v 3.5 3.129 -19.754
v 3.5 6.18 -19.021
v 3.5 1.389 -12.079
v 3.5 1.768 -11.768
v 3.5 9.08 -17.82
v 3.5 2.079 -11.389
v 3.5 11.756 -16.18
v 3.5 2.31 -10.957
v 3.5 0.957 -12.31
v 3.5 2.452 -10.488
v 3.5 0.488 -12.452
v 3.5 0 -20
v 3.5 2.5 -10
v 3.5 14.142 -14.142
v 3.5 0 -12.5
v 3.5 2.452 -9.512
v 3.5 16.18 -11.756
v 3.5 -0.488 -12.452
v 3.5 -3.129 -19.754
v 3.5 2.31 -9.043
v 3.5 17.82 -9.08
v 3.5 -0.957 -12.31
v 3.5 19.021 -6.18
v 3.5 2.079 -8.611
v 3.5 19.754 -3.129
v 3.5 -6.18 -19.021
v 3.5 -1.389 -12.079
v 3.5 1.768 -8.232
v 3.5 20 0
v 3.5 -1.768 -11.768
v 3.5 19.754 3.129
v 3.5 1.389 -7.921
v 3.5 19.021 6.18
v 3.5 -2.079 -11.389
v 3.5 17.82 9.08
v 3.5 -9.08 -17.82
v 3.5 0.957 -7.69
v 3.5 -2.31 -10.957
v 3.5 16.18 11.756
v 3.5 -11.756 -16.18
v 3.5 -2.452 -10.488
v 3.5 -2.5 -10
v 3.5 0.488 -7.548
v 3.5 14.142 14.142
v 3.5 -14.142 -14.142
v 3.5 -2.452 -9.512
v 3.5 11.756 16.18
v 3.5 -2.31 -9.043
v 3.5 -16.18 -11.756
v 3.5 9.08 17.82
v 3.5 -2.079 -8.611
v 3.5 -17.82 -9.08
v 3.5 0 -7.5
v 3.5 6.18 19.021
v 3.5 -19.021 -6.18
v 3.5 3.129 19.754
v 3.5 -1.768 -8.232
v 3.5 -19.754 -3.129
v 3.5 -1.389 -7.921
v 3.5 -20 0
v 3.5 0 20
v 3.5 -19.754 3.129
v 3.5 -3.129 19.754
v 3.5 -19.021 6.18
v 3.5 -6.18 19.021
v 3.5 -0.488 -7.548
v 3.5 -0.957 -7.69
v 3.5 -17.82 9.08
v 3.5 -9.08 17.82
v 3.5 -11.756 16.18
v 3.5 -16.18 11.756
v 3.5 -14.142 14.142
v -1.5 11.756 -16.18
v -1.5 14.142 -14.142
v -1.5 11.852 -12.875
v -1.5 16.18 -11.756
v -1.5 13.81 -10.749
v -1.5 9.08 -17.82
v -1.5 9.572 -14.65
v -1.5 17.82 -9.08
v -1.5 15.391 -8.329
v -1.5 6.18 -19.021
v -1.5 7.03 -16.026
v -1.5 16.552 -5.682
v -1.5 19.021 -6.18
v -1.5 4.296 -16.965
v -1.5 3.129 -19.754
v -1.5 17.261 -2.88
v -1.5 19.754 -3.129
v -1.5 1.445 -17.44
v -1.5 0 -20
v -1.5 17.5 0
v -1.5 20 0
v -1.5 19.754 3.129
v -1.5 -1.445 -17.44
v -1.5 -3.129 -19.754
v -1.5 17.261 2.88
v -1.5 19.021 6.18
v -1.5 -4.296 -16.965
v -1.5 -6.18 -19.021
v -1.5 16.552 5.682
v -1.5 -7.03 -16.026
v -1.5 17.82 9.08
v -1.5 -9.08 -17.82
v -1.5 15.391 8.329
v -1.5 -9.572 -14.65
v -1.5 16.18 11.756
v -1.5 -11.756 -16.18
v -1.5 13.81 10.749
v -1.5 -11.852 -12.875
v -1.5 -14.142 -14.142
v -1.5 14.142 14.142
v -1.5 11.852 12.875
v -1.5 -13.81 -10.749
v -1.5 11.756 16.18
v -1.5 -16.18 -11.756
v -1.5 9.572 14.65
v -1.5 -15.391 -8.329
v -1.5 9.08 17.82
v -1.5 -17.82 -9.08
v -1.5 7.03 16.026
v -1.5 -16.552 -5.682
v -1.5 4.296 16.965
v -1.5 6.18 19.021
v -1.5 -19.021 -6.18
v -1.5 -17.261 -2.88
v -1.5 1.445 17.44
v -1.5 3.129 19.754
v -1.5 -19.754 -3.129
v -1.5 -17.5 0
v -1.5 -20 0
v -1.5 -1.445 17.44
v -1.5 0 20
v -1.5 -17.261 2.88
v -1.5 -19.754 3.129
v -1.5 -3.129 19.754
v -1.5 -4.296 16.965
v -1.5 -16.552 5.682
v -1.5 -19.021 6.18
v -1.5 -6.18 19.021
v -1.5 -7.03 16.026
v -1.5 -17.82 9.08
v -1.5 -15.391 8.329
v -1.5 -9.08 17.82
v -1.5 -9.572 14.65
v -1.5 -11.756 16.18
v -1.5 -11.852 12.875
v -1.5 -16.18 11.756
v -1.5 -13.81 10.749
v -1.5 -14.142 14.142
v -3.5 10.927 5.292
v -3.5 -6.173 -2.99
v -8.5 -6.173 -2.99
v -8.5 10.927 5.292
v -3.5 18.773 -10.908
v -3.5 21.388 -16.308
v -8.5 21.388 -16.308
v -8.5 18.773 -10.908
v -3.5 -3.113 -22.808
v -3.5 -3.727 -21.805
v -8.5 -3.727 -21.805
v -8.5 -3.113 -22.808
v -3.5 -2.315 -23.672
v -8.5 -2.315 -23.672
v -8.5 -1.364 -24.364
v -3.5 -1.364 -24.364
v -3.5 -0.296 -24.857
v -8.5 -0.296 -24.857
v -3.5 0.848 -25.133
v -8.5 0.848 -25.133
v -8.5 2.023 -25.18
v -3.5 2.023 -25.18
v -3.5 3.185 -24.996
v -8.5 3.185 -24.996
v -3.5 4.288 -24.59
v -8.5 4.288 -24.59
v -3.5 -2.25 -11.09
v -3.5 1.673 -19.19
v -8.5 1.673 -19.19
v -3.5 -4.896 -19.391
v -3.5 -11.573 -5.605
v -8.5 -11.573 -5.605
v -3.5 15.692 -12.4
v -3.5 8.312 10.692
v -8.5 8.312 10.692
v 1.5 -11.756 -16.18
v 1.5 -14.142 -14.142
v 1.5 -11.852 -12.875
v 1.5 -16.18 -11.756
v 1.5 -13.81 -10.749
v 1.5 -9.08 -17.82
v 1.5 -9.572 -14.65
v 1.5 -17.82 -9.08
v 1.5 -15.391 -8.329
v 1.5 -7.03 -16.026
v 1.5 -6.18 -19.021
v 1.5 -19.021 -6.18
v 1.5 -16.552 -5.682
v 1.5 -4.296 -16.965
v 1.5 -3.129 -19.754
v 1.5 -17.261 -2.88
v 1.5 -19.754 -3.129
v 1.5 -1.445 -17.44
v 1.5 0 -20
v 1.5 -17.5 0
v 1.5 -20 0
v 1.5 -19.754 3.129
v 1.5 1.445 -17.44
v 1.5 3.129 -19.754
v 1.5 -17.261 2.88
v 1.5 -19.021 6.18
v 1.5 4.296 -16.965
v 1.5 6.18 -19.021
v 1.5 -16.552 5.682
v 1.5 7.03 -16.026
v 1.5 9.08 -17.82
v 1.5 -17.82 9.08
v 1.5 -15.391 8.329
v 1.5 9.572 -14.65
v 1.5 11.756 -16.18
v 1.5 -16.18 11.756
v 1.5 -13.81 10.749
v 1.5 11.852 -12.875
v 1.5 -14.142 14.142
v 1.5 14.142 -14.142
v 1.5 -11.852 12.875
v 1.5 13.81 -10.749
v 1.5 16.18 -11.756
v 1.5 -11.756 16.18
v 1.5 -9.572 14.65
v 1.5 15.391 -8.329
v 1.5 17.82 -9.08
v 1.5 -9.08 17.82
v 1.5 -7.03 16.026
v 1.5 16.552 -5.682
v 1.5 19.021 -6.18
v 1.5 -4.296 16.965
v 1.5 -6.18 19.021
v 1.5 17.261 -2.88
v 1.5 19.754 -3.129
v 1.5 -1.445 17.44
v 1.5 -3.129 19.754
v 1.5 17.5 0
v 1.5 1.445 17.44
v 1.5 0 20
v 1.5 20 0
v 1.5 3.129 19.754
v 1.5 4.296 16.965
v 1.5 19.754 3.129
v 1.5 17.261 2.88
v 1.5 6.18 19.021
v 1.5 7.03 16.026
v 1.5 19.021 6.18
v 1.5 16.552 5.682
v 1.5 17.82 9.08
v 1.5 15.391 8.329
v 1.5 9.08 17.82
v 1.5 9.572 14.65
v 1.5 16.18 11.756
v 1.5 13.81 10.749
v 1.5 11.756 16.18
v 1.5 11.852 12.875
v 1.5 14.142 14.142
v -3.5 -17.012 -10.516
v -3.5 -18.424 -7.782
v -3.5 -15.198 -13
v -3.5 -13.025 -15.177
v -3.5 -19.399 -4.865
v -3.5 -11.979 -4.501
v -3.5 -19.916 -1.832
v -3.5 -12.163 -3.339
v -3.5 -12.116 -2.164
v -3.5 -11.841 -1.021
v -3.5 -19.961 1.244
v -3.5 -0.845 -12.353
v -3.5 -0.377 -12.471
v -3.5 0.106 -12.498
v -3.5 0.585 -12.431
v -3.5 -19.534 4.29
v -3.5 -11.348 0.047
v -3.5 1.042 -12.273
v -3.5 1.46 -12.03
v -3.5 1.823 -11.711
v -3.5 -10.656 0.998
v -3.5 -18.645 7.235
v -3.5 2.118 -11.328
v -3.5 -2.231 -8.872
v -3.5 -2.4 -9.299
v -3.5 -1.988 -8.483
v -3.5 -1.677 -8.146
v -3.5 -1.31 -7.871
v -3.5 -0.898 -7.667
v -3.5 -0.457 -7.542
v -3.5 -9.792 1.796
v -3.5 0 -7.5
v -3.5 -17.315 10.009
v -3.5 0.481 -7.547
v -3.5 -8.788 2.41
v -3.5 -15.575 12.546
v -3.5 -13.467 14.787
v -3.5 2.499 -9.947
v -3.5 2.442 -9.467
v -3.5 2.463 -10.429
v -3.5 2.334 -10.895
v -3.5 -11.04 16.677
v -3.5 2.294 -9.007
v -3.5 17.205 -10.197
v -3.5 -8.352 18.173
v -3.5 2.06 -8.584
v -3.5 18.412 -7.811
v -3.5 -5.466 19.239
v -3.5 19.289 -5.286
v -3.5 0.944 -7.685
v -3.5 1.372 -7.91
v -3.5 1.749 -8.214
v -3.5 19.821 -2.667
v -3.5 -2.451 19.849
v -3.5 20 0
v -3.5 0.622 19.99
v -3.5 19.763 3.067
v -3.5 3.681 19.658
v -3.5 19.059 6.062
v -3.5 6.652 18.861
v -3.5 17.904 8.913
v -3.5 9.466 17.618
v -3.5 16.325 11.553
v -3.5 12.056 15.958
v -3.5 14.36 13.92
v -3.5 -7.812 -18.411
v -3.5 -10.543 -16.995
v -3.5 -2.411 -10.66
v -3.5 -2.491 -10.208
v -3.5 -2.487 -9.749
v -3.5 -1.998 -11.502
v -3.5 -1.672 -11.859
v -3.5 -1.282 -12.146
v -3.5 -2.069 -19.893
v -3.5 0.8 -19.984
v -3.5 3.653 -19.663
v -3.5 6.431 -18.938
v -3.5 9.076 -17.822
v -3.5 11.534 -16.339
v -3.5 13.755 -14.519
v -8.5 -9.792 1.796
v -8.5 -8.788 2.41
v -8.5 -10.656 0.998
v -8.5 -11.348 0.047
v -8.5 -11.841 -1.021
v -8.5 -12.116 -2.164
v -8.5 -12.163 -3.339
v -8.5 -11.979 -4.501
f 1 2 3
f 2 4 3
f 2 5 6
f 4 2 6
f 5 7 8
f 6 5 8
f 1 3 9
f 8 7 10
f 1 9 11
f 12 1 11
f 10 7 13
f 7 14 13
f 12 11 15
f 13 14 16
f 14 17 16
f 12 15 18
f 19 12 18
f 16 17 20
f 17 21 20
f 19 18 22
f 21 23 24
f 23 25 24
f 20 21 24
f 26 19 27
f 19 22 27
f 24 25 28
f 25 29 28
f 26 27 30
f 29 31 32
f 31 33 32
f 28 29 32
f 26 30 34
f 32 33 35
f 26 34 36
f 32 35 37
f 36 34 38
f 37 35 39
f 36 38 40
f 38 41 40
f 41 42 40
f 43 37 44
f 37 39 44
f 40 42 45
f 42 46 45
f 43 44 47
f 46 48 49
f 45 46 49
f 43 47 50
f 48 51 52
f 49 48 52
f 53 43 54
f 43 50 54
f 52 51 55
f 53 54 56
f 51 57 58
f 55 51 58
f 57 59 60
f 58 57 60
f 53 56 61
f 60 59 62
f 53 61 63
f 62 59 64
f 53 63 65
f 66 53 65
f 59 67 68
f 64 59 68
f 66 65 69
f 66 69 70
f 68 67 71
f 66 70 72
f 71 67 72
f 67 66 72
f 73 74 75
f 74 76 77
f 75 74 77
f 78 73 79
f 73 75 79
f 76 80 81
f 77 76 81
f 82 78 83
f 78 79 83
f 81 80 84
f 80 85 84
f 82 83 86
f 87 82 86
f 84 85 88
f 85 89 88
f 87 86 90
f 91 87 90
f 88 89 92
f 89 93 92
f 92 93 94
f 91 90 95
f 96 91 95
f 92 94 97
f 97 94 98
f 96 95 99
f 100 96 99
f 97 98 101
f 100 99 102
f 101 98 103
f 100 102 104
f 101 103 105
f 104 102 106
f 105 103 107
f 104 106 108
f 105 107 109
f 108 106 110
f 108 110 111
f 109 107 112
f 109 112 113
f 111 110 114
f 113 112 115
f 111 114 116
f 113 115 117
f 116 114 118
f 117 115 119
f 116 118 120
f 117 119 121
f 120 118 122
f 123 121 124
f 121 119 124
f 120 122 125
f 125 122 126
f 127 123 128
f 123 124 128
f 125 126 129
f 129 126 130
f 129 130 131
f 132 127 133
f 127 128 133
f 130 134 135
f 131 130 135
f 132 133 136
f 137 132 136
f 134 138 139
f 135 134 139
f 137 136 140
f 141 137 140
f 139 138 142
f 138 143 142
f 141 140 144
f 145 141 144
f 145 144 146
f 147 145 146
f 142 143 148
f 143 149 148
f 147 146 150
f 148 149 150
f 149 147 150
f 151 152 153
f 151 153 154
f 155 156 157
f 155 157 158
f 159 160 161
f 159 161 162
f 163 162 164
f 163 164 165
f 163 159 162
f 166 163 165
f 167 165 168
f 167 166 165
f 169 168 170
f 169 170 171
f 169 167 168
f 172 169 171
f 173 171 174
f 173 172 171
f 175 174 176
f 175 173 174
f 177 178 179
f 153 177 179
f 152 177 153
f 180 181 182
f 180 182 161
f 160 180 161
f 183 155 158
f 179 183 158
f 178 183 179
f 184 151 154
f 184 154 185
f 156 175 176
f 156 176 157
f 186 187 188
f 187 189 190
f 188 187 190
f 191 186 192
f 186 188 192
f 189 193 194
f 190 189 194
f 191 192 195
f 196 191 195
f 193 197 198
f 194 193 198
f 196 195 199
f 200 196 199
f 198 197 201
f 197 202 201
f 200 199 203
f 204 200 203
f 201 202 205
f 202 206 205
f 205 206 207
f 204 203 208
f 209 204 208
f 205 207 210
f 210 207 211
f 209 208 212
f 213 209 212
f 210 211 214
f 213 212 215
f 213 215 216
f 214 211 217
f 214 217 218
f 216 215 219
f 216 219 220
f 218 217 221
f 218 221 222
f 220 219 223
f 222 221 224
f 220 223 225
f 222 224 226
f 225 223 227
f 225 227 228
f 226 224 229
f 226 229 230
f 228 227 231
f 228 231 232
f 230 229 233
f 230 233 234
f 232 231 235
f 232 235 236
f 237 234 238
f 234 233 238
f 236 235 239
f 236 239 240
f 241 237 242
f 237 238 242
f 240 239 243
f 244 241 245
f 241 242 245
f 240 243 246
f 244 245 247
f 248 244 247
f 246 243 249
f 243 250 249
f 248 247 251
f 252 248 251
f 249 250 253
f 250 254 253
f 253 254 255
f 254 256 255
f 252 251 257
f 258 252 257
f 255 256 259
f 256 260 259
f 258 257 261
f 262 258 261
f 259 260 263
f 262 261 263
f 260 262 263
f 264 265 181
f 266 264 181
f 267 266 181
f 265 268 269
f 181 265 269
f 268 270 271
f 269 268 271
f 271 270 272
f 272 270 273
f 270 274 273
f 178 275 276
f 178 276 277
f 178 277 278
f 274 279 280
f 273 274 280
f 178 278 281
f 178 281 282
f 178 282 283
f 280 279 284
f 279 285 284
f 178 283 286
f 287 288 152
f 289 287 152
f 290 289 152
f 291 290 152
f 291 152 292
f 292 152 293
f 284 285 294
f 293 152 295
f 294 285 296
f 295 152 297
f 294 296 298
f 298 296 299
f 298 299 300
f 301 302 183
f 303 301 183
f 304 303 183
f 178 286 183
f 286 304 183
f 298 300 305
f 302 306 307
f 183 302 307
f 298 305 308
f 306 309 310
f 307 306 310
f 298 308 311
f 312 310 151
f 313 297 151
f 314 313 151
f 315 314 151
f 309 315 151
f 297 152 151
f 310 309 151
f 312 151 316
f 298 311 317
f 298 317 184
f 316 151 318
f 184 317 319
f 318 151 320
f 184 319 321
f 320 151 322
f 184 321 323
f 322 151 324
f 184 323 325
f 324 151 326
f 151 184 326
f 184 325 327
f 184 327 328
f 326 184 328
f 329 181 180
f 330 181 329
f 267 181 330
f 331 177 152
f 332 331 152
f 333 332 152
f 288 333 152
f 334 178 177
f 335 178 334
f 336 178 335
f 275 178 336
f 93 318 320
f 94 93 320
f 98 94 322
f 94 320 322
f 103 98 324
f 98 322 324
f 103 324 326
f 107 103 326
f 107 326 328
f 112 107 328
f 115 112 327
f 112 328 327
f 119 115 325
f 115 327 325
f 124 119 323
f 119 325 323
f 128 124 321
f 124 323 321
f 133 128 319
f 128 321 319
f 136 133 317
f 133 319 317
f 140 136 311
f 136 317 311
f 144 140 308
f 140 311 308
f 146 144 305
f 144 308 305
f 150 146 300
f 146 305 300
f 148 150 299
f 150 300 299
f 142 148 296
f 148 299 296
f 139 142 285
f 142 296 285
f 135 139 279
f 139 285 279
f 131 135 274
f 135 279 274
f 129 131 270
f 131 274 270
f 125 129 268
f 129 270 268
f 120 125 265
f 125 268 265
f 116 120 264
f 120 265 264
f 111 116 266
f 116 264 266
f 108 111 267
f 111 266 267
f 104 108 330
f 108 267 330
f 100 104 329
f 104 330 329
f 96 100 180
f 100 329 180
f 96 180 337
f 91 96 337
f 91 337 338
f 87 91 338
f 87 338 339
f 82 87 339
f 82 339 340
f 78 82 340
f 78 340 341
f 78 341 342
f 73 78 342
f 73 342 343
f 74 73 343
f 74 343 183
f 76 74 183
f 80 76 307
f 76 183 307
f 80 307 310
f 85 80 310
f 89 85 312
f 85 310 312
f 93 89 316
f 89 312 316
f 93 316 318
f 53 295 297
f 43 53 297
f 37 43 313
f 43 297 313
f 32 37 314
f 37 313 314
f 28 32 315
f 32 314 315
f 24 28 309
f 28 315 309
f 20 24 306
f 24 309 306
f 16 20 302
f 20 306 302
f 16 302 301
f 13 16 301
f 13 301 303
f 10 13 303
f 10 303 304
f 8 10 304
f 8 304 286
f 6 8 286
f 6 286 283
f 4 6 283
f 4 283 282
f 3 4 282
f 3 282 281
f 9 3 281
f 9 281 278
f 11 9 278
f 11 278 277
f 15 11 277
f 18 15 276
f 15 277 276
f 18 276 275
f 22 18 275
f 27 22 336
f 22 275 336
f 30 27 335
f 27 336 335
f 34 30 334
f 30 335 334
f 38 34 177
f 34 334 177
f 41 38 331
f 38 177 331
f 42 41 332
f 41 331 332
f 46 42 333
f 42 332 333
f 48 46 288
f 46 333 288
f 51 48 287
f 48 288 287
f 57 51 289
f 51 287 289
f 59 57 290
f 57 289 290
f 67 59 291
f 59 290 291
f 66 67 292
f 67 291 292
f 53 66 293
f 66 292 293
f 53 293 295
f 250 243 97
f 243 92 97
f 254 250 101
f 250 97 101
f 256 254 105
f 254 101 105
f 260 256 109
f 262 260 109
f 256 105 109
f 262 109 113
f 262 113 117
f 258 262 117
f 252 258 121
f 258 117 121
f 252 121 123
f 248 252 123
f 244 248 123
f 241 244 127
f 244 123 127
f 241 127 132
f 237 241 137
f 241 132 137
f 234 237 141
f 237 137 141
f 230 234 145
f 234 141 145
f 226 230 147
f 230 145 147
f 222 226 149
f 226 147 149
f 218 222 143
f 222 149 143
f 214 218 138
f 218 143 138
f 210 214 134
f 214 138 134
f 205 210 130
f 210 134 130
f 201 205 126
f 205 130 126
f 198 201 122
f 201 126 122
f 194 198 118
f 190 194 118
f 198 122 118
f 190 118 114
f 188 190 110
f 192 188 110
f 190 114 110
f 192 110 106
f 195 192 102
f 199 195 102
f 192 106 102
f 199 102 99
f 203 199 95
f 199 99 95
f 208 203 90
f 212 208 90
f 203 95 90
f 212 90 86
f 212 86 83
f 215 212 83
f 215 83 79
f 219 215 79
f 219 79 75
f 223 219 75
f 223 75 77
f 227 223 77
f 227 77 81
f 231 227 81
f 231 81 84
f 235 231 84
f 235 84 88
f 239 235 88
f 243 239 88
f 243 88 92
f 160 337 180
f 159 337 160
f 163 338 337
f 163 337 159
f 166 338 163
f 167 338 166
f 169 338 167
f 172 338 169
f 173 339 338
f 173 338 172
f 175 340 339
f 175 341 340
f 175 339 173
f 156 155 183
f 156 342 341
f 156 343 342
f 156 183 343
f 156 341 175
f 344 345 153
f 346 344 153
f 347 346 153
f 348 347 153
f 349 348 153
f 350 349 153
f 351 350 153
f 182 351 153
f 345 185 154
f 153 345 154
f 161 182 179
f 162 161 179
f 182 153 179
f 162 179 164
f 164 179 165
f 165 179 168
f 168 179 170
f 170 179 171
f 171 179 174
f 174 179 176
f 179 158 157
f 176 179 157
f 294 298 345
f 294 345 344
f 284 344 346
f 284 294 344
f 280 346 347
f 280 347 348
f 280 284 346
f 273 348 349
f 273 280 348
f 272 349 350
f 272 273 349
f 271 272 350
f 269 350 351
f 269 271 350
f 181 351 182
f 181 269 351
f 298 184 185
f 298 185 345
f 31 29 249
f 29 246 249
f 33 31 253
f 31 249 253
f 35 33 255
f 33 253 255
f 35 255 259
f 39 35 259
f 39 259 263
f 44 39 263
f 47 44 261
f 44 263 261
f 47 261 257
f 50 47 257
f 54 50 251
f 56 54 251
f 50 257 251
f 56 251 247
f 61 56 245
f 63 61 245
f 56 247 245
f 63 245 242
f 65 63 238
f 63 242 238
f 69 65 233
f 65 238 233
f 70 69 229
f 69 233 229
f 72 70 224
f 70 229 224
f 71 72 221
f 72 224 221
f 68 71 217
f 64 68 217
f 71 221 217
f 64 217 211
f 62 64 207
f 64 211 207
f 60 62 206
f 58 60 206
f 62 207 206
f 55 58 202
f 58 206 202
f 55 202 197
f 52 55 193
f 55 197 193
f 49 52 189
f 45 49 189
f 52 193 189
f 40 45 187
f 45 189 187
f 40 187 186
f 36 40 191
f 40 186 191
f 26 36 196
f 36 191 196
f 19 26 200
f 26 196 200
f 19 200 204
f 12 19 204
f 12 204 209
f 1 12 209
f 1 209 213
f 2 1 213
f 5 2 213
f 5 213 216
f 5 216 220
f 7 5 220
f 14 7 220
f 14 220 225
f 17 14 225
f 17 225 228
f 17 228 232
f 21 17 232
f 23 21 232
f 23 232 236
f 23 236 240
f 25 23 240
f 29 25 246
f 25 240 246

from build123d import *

# Parameters (mm, degrees)
BOSS_EXTRUDE1_DEPTH = 5
SKETCH4_R           = 2.5
CUT_EXTRUDE1_DEPTH  = 8


with BuildPart() as part:
    # Sketch1 → Revolve1 (revolve)
    with BuildSketch(Plane.XY):
        Polygon((-3.5, 20), (-3.5, 0), (3.5, 0), (3.5, 20), (1.5, 20), (1.5, 17.5), (-1.5, 17.5), (-1.5, 20), align=None)
    revolve(axis=Axis((-3.5, 0, 0), (1, 0, 0)))

    # Sketch3 → Boss-Extrude1 (add)
    with BuildSketch(Plane.ZY.offset(3.5)):
        with BuildLine():
            Line((-10.907816743, 18.773009049), (-19.189724736, 1.673009049))
            Line((-19.189724736, 1.673009049), (-2.989724736, -6.173009049))
            Line((-2.989724736, -6.173009049), (5.292183257, 10.926990951))
            Line((5.292183257, 10.926990951), (10.692183257, 8.311651585))
            Line((10.692183257, 8.311651585), (2.410275264, -8.788348415))
            ThreePointArc((2.410275264, -8.788348415), (-1.020672318, -11.840709868), (-5.605064102, -11.573009049))
            Line((-5.605064102, -11.573009049), (-21.805064102, -3.726990951))
            ThreePointArc((-21.805064102, -3.726990951), (-24.857425555, -0.296043368), (-24.589724736, 4.288348415))
            Line((-24.589724736, 4.288348415), (-16.307816743, 21.388348415))
            Line((-16.307816743, 21.388348415), (-10.907816743, 18.773009049))
        make_face()
    extrude(amount=BOSS_EXTRUDE1_DEPTH)

    # Sketch4 → Cut-Extrude1 (cut, through all)
    with BuildSketch(Plane.ZY.offset(3.5)):
        with Locations((-10, 0)):
            Circle(SKETCH4_R)
    extrude(amount=-CUT_EXTRUDE1_DEPTH, mode=Mode.SUBTRACT)


solid = part.part
